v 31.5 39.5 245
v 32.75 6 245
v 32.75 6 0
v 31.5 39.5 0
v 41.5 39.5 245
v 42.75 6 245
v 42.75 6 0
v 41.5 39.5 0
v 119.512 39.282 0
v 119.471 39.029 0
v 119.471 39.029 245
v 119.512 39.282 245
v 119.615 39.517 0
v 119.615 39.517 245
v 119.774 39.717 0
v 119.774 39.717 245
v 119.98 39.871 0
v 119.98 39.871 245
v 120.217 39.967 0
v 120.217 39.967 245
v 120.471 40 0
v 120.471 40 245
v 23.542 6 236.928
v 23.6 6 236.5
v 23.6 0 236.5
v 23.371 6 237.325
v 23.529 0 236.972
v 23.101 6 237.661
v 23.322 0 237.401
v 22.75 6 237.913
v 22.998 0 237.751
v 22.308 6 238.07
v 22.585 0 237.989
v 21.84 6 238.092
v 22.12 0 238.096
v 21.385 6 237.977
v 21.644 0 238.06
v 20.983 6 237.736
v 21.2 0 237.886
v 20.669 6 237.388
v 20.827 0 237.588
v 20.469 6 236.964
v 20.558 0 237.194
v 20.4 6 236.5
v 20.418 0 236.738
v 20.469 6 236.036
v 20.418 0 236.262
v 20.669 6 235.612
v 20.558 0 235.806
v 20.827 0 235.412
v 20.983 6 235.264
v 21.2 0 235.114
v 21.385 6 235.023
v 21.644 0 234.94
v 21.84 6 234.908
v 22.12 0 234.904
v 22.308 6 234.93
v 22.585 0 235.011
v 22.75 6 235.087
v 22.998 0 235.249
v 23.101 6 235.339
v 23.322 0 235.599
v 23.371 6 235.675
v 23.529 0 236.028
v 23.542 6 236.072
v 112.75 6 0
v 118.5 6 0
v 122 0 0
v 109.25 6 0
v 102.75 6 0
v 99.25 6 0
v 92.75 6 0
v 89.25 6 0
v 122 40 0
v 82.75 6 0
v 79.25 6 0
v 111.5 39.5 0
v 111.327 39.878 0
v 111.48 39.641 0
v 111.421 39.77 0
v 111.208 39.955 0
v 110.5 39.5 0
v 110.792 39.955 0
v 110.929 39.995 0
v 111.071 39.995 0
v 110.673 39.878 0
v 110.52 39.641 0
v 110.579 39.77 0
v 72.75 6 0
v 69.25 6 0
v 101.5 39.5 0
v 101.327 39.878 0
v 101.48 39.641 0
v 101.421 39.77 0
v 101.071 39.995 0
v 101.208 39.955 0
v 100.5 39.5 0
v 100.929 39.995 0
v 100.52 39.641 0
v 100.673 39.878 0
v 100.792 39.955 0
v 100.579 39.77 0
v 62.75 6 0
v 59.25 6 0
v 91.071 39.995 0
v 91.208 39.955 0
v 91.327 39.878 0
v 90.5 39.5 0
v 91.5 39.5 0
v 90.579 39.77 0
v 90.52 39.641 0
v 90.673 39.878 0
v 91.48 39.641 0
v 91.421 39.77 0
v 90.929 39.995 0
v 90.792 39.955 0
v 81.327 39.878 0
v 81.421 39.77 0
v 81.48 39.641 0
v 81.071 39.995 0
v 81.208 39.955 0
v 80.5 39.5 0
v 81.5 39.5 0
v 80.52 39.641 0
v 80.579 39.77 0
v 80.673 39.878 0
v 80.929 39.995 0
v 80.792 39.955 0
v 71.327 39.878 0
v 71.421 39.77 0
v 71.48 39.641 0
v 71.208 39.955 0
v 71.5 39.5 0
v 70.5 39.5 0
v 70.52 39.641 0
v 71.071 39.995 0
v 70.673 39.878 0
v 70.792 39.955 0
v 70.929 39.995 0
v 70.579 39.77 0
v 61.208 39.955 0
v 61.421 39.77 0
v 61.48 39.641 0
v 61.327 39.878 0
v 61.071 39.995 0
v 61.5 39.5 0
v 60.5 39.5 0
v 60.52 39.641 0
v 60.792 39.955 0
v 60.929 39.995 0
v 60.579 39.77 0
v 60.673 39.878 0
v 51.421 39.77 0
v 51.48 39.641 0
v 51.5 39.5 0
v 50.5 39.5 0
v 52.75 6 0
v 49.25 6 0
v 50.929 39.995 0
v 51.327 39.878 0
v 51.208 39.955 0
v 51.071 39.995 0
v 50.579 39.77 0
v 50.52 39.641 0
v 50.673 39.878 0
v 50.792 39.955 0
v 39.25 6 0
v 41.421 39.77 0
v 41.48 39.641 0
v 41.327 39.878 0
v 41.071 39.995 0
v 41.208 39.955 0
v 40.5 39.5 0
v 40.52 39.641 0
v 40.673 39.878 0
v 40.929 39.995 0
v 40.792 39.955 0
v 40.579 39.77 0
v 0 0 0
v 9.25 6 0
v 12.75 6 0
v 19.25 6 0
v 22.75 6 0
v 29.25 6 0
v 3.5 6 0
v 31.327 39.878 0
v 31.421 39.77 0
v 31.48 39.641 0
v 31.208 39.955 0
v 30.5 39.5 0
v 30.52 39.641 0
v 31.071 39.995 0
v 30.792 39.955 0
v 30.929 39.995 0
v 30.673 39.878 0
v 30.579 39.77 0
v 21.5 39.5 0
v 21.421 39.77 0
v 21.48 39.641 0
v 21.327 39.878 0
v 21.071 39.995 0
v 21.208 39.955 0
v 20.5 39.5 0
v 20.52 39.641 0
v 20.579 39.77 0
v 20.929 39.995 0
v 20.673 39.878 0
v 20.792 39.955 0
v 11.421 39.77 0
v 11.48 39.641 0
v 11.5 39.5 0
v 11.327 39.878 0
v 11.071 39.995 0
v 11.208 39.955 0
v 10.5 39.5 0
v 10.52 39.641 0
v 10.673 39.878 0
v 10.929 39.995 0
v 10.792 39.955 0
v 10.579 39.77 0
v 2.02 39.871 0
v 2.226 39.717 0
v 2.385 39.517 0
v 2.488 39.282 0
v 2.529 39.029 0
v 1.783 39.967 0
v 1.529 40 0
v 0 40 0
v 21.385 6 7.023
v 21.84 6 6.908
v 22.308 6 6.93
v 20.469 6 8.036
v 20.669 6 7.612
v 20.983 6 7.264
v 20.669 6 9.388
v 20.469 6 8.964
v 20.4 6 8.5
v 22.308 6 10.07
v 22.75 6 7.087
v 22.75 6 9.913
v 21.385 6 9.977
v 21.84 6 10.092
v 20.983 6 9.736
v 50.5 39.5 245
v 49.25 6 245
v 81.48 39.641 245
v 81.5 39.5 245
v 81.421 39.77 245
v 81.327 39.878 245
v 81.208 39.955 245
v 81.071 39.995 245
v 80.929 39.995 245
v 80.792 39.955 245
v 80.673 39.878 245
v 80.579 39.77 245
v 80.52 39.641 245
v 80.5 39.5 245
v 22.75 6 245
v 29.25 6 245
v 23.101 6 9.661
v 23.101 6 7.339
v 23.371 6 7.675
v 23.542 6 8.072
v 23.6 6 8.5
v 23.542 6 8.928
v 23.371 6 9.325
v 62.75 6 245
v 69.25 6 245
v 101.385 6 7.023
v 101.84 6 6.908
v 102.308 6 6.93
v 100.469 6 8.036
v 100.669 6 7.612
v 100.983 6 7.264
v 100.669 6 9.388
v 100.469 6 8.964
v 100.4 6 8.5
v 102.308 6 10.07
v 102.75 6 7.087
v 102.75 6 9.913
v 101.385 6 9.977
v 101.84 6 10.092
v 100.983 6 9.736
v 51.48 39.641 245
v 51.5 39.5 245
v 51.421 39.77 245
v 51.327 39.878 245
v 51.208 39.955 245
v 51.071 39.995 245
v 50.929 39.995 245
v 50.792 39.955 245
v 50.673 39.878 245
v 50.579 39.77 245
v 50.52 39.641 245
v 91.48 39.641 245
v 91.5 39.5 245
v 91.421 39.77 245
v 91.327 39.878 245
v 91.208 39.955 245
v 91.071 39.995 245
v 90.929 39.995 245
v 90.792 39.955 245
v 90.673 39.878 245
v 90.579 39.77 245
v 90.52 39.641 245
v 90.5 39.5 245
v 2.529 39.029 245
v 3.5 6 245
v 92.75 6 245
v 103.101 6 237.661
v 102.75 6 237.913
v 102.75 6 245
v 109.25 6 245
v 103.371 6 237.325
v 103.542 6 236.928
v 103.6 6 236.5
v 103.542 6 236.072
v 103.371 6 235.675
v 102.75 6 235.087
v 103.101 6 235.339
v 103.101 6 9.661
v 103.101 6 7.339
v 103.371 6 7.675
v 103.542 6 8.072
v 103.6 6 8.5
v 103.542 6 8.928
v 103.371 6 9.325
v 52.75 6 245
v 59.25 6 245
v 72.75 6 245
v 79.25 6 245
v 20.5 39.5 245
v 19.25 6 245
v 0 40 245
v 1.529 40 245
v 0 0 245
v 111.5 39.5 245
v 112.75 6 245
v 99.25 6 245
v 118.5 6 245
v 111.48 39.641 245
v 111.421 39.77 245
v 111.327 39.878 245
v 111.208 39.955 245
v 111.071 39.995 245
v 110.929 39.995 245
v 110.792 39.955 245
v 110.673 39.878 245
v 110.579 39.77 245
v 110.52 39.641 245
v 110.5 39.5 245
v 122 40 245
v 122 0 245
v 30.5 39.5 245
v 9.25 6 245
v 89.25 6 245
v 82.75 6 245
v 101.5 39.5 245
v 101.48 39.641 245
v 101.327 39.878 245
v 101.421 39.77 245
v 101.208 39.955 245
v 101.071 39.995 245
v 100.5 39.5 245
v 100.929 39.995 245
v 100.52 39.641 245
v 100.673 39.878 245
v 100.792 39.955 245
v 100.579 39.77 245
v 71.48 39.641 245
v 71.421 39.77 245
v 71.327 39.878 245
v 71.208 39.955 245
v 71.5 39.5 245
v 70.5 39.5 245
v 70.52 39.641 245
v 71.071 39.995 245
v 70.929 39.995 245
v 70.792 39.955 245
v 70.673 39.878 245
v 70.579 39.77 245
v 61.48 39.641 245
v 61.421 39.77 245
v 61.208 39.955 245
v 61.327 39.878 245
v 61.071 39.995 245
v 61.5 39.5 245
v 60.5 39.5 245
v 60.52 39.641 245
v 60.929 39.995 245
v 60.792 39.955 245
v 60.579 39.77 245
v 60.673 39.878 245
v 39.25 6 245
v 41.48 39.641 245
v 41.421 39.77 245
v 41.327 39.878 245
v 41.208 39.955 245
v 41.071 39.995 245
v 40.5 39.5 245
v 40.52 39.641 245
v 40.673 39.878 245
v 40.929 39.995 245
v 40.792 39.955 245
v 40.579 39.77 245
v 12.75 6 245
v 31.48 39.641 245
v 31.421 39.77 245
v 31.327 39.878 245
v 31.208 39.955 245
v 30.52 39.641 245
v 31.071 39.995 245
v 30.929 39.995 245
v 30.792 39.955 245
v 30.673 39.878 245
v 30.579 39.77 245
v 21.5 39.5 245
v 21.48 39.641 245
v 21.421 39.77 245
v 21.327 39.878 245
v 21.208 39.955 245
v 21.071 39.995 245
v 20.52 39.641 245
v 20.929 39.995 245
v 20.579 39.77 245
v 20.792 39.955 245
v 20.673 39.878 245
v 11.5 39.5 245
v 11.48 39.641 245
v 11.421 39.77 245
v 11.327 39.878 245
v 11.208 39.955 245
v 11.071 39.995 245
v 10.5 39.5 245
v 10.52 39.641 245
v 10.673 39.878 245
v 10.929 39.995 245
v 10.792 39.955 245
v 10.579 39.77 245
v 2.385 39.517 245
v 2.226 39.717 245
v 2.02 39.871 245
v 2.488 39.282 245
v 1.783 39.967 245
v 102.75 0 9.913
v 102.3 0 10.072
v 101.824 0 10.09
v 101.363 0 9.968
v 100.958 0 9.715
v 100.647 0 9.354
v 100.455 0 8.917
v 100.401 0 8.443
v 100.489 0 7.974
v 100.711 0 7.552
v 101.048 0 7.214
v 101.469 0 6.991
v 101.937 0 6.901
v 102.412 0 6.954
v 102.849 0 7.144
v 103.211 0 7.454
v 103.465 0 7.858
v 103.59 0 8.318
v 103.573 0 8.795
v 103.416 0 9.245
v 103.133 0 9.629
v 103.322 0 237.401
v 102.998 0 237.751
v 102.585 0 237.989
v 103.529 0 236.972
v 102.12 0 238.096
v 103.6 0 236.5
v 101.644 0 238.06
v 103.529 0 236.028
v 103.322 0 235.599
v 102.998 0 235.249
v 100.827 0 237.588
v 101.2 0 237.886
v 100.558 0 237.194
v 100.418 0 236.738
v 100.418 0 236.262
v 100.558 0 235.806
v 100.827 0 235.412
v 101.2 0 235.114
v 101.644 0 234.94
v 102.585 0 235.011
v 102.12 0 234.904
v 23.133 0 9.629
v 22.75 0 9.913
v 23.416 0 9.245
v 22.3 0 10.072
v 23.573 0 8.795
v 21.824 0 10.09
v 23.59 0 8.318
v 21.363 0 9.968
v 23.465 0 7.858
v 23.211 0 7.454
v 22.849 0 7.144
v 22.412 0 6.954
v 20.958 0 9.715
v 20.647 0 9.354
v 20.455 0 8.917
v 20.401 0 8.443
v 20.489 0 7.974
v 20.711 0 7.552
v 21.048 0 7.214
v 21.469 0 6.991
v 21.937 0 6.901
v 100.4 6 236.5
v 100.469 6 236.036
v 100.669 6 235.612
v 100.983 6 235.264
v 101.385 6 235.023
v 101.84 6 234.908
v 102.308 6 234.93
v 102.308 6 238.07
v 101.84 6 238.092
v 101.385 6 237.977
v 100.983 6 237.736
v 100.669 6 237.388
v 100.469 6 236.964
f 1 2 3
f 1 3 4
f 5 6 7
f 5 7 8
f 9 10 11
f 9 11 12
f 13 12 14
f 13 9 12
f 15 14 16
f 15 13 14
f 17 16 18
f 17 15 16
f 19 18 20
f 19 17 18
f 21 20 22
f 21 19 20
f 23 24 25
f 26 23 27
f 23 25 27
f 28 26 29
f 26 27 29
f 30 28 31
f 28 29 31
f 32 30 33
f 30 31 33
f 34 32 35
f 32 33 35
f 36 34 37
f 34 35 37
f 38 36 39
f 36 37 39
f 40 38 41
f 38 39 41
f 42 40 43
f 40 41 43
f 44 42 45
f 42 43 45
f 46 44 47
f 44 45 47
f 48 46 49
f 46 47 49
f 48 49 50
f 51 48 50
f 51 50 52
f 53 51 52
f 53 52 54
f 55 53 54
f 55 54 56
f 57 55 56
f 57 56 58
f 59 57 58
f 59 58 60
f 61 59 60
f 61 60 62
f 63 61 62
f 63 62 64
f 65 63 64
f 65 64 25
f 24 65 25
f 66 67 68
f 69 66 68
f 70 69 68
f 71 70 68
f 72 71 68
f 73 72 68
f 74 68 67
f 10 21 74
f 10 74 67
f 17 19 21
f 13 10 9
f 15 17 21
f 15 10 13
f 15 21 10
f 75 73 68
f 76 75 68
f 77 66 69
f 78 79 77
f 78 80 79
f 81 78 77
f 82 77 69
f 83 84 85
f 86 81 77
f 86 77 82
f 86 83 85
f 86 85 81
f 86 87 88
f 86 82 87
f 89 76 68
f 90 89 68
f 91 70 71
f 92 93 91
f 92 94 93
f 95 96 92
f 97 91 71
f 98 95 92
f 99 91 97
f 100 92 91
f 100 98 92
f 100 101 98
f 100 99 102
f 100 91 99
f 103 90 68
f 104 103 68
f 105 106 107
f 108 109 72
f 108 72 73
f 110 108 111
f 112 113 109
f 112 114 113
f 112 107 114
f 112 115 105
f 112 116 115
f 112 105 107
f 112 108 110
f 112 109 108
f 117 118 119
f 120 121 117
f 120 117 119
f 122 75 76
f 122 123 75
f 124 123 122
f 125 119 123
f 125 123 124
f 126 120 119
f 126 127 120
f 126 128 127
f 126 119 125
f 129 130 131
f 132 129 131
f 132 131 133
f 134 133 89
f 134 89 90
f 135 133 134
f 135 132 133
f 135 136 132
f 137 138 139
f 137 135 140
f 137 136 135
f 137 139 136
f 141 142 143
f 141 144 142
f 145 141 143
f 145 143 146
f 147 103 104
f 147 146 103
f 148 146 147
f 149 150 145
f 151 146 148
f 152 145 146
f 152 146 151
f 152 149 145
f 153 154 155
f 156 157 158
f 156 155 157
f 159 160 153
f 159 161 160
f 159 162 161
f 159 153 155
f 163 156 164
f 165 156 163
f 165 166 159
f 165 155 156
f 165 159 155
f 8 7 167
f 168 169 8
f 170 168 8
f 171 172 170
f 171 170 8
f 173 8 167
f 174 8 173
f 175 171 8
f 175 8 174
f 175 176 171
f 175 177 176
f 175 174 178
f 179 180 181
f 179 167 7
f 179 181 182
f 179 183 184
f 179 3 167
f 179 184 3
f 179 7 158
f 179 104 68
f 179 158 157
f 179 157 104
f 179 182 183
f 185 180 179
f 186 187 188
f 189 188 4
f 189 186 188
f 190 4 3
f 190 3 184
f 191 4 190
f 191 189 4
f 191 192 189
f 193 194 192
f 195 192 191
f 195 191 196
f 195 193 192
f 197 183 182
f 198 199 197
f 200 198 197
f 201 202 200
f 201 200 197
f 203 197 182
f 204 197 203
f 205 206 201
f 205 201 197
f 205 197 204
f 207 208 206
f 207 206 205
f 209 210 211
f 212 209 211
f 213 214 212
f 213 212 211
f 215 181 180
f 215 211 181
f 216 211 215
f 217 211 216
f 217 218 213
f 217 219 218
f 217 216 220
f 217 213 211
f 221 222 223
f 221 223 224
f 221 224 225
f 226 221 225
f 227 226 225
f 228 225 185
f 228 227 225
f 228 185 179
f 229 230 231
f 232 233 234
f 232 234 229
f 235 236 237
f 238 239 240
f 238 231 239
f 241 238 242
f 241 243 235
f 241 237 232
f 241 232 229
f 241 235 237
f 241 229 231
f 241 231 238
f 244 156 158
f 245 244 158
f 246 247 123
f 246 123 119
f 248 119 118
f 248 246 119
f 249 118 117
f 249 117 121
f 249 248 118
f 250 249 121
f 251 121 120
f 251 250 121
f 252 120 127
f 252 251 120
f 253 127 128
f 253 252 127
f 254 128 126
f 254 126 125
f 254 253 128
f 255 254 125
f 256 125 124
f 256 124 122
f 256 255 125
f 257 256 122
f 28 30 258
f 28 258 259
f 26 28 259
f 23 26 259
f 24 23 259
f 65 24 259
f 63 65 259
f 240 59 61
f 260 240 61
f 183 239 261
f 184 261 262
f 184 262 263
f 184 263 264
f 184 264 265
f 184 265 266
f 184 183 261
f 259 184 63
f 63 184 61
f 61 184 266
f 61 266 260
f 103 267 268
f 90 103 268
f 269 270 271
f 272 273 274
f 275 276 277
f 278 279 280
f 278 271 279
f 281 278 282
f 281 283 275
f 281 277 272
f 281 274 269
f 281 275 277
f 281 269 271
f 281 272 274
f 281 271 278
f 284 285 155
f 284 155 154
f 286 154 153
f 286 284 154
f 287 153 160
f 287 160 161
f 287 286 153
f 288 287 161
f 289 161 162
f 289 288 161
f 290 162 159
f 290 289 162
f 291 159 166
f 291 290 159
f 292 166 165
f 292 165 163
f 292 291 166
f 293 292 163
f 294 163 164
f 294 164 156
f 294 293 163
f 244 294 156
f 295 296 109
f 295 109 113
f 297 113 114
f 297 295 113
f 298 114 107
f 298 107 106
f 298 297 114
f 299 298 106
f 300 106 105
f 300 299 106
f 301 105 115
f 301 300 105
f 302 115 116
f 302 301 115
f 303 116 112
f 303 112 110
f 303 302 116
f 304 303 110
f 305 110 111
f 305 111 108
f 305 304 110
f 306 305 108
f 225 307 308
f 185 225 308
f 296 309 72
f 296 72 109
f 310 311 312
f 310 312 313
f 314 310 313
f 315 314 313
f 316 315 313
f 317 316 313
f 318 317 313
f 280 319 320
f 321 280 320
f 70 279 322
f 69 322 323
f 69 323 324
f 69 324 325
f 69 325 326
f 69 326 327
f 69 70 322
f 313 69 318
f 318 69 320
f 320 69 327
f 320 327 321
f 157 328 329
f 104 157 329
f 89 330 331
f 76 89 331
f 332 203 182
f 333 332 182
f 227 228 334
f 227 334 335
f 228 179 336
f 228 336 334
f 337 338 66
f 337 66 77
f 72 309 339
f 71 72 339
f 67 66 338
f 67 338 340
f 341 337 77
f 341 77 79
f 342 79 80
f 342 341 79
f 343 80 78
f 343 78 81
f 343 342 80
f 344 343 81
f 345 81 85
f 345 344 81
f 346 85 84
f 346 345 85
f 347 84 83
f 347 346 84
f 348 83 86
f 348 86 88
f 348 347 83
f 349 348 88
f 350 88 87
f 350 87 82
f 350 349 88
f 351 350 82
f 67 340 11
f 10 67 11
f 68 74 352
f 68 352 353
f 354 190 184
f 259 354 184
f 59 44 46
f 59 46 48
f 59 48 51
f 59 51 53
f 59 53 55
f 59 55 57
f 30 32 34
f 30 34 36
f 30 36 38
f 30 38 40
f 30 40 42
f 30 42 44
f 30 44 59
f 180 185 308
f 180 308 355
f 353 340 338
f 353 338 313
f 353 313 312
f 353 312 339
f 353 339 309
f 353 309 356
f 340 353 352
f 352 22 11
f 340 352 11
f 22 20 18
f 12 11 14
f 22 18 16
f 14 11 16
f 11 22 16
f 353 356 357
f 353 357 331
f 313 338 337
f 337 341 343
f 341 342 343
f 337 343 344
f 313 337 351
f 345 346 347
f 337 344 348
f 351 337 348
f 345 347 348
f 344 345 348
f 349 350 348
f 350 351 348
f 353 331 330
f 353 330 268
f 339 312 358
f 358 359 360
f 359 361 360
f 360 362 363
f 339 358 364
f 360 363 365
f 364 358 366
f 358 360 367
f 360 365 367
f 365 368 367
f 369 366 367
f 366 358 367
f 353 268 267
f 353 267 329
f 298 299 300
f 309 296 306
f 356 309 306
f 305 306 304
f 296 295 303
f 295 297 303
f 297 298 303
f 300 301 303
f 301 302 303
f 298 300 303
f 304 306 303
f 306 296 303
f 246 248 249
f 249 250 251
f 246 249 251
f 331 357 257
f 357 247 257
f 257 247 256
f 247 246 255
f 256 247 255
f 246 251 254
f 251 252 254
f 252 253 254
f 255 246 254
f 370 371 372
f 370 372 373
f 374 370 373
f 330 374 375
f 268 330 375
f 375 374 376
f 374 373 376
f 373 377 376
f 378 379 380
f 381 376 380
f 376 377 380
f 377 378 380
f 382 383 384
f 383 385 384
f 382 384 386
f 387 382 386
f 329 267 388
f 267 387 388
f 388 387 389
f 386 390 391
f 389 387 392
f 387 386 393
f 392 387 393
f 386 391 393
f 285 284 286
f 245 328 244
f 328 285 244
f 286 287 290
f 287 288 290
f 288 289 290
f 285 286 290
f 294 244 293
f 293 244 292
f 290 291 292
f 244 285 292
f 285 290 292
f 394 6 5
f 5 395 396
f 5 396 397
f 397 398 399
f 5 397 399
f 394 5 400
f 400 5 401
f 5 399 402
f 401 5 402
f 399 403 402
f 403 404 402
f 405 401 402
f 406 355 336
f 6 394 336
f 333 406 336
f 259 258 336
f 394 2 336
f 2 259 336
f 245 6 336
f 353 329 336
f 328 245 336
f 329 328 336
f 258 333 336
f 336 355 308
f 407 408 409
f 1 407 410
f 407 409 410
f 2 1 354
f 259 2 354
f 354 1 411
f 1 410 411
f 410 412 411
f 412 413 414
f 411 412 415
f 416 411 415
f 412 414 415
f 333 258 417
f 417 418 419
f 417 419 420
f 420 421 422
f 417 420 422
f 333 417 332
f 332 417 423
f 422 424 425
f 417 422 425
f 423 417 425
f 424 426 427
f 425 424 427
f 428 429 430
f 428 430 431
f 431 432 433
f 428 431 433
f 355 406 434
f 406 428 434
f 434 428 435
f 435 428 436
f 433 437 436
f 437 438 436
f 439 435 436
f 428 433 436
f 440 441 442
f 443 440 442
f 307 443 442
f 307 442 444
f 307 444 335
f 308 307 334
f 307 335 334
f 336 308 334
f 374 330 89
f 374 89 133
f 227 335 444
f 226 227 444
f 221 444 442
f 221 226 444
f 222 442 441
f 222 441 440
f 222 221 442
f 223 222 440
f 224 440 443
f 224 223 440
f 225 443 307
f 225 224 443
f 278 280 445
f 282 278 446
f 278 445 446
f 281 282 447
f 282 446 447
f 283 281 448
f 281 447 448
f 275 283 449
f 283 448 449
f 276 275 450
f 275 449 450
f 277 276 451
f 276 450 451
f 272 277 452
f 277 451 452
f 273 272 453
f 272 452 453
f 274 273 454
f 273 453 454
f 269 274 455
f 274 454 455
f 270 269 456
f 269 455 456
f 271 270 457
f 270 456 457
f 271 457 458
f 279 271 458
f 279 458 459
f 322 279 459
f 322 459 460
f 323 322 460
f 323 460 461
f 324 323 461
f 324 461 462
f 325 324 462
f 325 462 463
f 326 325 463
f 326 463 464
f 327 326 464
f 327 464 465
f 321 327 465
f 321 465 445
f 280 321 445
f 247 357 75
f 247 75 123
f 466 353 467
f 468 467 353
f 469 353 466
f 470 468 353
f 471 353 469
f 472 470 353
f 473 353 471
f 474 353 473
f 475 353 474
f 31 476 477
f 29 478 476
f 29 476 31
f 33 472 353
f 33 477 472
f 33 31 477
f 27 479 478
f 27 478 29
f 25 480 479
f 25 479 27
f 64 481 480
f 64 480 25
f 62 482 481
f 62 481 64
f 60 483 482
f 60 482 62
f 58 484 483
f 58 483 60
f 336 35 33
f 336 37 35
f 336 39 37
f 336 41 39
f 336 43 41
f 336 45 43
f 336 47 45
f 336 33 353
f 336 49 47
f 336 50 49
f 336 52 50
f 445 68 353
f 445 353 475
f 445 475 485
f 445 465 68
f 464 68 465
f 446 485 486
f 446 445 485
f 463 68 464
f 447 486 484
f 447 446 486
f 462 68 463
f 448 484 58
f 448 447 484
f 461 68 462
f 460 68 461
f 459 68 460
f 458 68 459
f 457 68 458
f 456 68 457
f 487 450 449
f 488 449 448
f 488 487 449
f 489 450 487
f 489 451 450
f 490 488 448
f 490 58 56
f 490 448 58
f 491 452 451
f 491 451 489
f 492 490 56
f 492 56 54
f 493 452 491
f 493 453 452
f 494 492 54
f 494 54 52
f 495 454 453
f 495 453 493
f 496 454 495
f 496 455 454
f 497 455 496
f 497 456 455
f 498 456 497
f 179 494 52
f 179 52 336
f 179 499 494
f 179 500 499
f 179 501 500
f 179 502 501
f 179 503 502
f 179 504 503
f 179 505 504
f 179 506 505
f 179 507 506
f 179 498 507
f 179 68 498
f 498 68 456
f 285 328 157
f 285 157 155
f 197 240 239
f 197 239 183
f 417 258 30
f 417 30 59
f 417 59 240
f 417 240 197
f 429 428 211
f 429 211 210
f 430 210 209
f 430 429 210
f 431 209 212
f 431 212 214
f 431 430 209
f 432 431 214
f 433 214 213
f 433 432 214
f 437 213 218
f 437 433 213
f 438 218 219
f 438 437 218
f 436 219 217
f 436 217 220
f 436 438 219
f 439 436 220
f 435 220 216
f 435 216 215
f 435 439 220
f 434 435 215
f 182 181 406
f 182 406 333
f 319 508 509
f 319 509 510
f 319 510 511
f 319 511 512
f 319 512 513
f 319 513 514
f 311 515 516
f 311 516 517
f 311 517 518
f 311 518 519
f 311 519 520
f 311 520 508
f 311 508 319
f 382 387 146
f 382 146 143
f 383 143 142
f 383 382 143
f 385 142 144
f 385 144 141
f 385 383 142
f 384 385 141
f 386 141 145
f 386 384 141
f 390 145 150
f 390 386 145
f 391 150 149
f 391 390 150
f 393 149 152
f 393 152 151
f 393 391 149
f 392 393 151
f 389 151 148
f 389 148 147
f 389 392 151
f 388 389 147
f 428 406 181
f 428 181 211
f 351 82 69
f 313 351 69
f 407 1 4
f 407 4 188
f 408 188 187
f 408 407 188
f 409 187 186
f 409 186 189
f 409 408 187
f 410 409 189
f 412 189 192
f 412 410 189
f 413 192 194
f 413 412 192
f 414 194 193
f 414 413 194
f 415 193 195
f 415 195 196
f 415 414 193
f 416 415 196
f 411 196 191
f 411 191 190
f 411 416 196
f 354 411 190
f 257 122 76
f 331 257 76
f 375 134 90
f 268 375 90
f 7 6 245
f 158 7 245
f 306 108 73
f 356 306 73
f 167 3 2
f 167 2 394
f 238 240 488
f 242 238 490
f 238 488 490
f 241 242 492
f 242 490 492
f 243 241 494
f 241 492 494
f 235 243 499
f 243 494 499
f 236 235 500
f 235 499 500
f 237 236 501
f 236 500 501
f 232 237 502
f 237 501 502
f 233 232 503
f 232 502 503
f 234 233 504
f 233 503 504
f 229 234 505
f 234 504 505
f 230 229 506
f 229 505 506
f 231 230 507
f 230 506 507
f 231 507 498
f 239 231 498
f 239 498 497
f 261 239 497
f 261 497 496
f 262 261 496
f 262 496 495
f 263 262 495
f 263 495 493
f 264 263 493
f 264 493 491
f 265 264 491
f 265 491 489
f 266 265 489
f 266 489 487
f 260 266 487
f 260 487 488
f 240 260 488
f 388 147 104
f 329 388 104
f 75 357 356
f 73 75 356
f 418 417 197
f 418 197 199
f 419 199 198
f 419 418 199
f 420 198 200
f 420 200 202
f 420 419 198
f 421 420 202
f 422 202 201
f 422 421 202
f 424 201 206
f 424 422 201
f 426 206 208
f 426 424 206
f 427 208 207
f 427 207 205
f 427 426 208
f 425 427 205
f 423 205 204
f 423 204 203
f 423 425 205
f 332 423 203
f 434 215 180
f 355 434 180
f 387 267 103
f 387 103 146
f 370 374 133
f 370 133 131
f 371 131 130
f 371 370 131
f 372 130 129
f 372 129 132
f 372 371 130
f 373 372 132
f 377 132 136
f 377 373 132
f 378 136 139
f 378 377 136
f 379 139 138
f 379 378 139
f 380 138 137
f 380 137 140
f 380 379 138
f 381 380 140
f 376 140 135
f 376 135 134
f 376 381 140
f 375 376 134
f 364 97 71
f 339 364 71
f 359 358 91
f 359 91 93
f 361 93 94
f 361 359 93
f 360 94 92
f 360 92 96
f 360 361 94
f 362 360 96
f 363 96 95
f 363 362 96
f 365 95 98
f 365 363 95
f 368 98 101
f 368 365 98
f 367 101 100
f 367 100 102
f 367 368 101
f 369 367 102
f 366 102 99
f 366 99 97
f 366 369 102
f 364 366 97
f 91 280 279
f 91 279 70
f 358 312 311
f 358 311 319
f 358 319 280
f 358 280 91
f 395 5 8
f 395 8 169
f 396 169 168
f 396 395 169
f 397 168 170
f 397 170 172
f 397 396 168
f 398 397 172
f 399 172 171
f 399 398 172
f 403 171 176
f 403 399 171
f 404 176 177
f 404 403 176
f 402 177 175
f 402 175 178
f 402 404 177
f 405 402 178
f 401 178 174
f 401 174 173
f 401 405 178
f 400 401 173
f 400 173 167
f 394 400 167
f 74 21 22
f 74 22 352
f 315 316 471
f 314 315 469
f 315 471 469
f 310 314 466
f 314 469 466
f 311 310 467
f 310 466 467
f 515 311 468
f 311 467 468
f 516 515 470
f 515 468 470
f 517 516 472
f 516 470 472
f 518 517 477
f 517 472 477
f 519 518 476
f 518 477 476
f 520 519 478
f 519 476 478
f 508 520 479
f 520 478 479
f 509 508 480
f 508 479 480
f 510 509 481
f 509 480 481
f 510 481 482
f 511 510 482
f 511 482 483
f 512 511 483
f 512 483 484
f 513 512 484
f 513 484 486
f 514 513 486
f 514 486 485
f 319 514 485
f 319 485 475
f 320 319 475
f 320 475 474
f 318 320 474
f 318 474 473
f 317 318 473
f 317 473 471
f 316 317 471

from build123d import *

# Parameters (mm, degrees)
EXTRUDE_1_DEPTH       = 245
EXTRUDE_3_DEPTH       = 245
PATTERN_CURVE_1_COUNT = 11
PATTERN_CURVE_1_PITCH = 10
SKETCH_3_R            = 1.6
CUT_EXTRUDE_1_DEPTH   = 6


with BuildPart() as part:
    # Эскиз1 → Вытянуть1 (new body)
    with BuildSketch(Plane.XY):
        with BuildLine():
            Line((0, 40), (1.528979332, 40))
            ThreePointArc((1.528979332, 40), (2.225614441, 39.717425624), (2.528547087, 39.029399052))
            Line((2.528547087, 39.029399052), (3.5, 6))
            Line((3.5, 6), (118.5, 6))
            Line((118.5, 6), (119.471452913, 39.029399052))
            ThreePointArc((119.471452913, 39.029399052), (119.774385559, 39.717425624), (120.471020668, 40))
            Line((120.471020668, 40), (122, 40))
            Line((122, 40), (122, 0))
            Line((122, 0), (0, 0))
            Line((0, 0), (0, 40))
        make_face()
    extrude(amount=EXTRUDE_1_DEPTH)

    # Эскиз2 → Вытянуть3 (add)
    with BuildSketch(Plane.XY.offset(245)):
        with BuildLine():
            Line((10.5, 39.5), (9.25, 6))
            Line((9.25, 6), (12.75, 6))
            Line((12.75, 6), (11.5, 39.5))
            ThreePointArc((11.5, 39.5), (11, 40), (10.5, 39.5))
        make_face()
    extrude_3 = extrude(amount=-EXTRUDE_3_DEPTH)

    # Кривая1: Вытянуть3 ×11
    with Locations(*[(i * PATTERN_CURVE_1_PITCH, 0, 0) for i in range(1, PATTERN_CURVE_1_COUNT)]):
        add(extrude_3)

    # Эскиз3 → Вырез-Вытянуть1 (cut)
    with BuildSketch(Plane.XZ):
        with Locations((22, 236.5)):
            Circle(SKETCH_3_R)
        with Locations((102, 236.5)):
            Circle(SKETCH_3_R)
        with Locations(Location((102, 8.5, 0), (0, 0, 62.046813117))):
            Circle(SKETCH_3_R)
        with Locations(Location((22, 8.5, 0), (0, 0, 62.046813117))):
            Circle(SKETCH_3_R)
    extrude(amount=-CUT_EXTRUDE_1_DEPTH, mode=Mode.SUBTRACT)


solid = part.part
